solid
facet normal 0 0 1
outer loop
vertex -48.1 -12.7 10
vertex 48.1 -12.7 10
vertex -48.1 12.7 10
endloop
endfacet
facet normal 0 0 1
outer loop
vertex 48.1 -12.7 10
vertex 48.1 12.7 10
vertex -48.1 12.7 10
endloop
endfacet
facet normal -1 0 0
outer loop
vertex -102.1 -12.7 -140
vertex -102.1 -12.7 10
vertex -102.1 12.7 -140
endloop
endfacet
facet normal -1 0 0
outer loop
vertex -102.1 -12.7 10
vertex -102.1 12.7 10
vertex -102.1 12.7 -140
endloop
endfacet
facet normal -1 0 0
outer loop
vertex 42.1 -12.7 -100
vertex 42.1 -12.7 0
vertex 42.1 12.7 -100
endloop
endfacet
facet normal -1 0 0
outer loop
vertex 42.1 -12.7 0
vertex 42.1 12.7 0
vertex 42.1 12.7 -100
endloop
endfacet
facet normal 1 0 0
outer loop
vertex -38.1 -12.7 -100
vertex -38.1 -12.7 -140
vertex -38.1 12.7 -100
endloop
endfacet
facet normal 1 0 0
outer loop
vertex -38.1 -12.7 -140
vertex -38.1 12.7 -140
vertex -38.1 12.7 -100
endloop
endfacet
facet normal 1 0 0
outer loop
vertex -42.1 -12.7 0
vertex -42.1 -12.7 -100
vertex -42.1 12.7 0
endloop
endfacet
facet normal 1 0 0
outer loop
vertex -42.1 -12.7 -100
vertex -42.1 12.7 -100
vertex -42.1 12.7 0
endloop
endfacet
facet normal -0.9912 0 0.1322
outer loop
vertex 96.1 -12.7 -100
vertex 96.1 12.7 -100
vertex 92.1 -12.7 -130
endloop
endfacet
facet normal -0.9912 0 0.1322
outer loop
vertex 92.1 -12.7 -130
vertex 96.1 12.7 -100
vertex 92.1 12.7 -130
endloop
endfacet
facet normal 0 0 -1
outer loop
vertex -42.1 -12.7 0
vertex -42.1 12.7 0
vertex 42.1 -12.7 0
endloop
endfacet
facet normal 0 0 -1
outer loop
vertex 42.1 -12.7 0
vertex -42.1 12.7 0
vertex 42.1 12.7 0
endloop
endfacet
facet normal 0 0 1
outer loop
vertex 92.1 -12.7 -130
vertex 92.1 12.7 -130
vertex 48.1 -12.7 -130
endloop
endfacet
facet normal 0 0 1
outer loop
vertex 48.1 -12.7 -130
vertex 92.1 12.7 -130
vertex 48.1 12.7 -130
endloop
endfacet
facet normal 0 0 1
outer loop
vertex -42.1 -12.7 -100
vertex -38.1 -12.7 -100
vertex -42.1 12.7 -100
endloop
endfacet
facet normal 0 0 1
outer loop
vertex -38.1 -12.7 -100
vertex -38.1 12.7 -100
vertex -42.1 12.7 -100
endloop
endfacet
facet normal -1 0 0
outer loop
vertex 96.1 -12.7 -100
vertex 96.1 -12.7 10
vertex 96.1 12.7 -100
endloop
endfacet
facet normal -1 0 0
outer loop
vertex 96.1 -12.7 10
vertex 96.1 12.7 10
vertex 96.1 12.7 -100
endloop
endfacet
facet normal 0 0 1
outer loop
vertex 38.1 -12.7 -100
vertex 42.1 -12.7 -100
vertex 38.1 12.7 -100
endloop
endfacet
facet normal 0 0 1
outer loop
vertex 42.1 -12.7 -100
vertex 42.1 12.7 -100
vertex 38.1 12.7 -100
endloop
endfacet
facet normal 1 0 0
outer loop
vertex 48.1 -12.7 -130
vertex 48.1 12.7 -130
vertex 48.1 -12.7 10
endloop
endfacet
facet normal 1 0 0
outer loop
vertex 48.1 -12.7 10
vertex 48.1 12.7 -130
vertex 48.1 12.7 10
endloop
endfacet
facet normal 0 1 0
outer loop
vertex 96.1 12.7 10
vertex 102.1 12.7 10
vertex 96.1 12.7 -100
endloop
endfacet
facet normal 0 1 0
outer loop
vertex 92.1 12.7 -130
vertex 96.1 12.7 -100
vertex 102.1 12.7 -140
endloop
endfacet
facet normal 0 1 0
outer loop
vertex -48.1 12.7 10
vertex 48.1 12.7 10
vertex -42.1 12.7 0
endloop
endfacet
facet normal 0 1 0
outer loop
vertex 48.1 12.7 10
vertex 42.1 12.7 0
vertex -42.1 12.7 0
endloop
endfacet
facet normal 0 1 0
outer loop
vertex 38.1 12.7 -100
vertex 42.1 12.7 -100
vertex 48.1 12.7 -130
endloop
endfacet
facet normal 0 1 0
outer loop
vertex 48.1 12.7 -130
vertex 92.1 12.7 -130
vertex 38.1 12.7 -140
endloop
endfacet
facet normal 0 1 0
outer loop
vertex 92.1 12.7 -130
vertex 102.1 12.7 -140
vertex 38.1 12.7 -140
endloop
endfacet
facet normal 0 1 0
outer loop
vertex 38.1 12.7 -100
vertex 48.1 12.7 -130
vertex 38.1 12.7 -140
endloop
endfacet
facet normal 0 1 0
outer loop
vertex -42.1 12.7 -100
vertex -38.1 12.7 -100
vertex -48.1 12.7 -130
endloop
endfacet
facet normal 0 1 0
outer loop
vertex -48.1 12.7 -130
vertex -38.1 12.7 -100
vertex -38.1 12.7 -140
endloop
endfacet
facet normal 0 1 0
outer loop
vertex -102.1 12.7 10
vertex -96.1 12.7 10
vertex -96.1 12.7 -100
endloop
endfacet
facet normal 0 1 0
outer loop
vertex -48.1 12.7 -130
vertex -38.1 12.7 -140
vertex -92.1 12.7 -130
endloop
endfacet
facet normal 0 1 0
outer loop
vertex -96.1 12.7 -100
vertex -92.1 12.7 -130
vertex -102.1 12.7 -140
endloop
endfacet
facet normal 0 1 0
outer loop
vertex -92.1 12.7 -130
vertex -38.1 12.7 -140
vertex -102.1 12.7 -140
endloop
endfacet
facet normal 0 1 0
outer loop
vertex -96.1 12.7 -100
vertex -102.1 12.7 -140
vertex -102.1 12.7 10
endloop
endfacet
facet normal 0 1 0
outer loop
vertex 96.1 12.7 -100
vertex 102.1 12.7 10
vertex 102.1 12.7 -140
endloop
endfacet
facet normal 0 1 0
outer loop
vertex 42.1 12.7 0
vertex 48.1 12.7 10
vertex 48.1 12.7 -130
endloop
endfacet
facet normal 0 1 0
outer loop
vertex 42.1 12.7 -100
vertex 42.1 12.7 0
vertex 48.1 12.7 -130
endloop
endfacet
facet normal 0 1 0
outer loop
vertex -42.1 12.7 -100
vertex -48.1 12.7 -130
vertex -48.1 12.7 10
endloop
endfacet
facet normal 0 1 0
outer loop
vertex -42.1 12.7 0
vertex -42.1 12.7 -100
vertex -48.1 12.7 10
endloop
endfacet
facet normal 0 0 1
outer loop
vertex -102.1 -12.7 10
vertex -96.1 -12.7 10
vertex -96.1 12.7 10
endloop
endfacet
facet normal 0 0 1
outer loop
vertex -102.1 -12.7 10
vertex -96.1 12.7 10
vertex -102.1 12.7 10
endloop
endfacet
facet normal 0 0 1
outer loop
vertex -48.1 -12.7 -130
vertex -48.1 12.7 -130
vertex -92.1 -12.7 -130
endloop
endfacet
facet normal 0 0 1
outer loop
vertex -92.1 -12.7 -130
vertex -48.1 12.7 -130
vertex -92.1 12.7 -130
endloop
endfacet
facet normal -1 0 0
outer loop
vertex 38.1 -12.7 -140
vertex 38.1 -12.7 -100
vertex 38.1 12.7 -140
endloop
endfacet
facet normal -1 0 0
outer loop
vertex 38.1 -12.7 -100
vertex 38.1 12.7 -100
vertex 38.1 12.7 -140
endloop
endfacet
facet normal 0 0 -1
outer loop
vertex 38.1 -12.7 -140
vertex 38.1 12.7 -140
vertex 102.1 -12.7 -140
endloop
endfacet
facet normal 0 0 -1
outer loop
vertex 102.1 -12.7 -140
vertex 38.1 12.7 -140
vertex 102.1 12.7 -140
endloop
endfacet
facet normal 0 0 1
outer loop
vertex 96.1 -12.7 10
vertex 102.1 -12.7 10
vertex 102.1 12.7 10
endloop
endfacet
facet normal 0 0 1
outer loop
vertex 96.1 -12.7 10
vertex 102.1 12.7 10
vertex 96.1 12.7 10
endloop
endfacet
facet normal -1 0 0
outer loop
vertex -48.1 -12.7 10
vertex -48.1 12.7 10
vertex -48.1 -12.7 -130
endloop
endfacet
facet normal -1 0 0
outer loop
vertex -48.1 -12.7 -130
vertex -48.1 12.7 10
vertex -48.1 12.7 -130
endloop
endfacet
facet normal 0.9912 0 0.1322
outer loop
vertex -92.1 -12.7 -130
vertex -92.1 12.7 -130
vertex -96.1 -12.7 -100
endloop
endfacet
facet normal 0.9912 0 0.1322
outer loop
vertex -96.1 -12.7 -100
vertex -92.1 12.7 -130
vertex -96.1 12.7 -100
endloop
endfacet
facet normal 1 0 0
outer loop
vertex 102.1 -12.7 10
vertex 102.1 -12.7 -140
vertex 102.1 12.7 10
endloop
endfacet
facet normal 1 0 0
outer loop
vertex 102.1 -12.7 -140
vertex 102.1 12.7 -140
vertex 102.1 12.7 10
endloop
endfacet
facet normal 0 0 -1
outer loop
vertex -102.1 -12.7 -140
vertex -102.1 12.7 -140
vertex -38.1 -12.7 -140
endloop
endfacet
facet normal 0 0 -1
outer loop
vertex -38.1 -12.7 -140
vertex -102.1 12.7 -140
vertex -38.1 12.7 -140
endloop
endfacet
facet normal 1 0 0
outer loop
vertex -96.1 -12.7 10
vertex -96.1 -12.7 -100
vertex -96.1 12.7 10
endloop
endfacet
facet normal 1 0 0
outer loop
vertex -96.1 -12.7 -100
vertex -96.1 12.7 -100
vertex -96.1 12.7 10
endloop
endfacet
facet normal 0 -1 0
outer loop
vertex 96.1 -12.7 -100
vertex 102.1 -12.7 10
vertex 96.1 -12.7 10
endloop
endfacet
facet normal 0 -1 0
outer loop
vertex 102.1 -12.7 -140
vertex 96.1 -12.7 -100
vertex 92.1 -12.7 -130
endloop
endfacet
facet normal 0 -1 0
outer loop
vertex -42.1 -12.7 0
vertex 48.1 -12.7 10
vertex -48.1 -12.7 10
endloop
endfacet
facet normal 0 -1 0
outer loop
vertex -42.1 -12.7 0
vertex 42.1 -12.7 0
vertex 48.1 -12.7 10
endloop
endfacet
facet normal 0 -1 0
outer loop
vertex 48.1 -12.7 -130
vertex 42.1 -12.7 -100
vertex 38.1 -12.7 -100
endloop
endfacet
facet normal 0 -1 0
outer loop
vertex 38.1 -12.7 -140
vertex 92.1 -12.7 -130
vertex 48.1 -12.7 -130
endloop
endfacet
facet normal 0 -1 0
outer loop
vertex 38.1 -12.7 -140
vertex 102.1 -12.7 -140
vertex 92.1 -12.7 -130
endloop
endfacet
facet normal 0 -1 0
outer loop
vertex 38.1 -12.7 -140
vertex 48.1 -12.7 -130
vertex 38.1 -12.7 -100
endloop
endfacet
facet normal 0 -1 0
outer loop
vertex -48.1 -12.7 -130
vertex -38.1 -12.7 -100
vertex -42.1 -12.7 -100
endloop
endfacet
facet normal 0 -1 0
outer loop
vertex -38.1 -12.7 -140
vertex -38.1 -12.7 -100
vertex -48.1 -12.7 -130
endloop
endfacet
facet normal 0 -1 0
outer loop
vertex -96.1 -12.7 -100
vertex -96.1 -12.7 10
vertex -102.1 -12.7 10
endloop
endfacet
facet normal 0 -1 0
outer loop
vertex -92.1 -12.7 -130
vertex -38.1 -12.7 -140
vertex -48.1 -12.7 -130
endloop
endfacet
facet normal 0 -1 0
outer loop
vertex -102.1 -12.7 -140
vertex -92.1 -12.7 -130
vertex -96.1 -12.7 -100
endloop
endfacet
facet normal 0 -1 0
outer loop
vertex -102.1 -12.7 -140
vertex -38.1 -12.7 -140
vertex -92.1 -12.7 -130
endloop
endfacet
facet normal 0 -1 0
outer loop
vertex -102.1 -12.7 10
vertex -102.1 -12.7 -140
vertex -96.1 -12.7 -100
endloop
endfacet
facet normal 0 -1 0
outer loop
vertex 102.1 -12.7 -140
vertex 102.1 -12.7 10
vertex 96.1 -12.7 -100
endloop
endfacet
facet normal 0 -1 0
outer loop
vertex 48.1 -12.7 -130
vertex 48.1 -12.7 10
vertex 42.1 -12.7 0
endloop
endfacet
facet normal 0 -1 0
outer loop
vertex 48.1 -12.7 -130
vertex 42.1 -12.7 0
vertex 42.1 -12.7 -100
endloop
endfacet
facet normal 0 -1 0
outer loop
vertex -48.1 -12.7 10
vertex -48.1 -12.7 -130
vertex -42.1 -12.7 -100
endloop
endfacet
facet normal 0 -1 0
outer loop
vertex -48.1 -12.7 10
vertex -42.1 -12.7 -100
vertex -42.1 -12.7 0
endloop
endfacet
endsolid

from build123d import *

# Parameters (mm, degrees)
BOSS_EXTRUDE1_DEPTH = 12.7


with BuildPart() as part:
    # Sketch1 → Boss-Extrude1 (new, symmetric)
    with BuildSketch(Plane(origin=(0, 0, 0), x_dir=(1, 0, 0), z_dir=(0, 1, 0))):
        Polygon((-92.1, 130), (-96.1, 100), (-96.1, -10), (-102.1, -10), (-102.1, 140), (-38.1, 140), (-38.1, 100), (-42.1, 100), (-42.1, 0), (42.1, 0), (42.1, 100), (38.1, 100), (38.1, 140), (102.1, 140), (102.1, -10), (96.1, -10), (96.1, 100), (92.1, 130), (48.1, 130), (48.1, -10), (-48.1, -10), (-48.1, 130), align=None)
    extrude(amount=BOSS_EXTRUDE1_DEPTH, both=True)


solid = part.part
